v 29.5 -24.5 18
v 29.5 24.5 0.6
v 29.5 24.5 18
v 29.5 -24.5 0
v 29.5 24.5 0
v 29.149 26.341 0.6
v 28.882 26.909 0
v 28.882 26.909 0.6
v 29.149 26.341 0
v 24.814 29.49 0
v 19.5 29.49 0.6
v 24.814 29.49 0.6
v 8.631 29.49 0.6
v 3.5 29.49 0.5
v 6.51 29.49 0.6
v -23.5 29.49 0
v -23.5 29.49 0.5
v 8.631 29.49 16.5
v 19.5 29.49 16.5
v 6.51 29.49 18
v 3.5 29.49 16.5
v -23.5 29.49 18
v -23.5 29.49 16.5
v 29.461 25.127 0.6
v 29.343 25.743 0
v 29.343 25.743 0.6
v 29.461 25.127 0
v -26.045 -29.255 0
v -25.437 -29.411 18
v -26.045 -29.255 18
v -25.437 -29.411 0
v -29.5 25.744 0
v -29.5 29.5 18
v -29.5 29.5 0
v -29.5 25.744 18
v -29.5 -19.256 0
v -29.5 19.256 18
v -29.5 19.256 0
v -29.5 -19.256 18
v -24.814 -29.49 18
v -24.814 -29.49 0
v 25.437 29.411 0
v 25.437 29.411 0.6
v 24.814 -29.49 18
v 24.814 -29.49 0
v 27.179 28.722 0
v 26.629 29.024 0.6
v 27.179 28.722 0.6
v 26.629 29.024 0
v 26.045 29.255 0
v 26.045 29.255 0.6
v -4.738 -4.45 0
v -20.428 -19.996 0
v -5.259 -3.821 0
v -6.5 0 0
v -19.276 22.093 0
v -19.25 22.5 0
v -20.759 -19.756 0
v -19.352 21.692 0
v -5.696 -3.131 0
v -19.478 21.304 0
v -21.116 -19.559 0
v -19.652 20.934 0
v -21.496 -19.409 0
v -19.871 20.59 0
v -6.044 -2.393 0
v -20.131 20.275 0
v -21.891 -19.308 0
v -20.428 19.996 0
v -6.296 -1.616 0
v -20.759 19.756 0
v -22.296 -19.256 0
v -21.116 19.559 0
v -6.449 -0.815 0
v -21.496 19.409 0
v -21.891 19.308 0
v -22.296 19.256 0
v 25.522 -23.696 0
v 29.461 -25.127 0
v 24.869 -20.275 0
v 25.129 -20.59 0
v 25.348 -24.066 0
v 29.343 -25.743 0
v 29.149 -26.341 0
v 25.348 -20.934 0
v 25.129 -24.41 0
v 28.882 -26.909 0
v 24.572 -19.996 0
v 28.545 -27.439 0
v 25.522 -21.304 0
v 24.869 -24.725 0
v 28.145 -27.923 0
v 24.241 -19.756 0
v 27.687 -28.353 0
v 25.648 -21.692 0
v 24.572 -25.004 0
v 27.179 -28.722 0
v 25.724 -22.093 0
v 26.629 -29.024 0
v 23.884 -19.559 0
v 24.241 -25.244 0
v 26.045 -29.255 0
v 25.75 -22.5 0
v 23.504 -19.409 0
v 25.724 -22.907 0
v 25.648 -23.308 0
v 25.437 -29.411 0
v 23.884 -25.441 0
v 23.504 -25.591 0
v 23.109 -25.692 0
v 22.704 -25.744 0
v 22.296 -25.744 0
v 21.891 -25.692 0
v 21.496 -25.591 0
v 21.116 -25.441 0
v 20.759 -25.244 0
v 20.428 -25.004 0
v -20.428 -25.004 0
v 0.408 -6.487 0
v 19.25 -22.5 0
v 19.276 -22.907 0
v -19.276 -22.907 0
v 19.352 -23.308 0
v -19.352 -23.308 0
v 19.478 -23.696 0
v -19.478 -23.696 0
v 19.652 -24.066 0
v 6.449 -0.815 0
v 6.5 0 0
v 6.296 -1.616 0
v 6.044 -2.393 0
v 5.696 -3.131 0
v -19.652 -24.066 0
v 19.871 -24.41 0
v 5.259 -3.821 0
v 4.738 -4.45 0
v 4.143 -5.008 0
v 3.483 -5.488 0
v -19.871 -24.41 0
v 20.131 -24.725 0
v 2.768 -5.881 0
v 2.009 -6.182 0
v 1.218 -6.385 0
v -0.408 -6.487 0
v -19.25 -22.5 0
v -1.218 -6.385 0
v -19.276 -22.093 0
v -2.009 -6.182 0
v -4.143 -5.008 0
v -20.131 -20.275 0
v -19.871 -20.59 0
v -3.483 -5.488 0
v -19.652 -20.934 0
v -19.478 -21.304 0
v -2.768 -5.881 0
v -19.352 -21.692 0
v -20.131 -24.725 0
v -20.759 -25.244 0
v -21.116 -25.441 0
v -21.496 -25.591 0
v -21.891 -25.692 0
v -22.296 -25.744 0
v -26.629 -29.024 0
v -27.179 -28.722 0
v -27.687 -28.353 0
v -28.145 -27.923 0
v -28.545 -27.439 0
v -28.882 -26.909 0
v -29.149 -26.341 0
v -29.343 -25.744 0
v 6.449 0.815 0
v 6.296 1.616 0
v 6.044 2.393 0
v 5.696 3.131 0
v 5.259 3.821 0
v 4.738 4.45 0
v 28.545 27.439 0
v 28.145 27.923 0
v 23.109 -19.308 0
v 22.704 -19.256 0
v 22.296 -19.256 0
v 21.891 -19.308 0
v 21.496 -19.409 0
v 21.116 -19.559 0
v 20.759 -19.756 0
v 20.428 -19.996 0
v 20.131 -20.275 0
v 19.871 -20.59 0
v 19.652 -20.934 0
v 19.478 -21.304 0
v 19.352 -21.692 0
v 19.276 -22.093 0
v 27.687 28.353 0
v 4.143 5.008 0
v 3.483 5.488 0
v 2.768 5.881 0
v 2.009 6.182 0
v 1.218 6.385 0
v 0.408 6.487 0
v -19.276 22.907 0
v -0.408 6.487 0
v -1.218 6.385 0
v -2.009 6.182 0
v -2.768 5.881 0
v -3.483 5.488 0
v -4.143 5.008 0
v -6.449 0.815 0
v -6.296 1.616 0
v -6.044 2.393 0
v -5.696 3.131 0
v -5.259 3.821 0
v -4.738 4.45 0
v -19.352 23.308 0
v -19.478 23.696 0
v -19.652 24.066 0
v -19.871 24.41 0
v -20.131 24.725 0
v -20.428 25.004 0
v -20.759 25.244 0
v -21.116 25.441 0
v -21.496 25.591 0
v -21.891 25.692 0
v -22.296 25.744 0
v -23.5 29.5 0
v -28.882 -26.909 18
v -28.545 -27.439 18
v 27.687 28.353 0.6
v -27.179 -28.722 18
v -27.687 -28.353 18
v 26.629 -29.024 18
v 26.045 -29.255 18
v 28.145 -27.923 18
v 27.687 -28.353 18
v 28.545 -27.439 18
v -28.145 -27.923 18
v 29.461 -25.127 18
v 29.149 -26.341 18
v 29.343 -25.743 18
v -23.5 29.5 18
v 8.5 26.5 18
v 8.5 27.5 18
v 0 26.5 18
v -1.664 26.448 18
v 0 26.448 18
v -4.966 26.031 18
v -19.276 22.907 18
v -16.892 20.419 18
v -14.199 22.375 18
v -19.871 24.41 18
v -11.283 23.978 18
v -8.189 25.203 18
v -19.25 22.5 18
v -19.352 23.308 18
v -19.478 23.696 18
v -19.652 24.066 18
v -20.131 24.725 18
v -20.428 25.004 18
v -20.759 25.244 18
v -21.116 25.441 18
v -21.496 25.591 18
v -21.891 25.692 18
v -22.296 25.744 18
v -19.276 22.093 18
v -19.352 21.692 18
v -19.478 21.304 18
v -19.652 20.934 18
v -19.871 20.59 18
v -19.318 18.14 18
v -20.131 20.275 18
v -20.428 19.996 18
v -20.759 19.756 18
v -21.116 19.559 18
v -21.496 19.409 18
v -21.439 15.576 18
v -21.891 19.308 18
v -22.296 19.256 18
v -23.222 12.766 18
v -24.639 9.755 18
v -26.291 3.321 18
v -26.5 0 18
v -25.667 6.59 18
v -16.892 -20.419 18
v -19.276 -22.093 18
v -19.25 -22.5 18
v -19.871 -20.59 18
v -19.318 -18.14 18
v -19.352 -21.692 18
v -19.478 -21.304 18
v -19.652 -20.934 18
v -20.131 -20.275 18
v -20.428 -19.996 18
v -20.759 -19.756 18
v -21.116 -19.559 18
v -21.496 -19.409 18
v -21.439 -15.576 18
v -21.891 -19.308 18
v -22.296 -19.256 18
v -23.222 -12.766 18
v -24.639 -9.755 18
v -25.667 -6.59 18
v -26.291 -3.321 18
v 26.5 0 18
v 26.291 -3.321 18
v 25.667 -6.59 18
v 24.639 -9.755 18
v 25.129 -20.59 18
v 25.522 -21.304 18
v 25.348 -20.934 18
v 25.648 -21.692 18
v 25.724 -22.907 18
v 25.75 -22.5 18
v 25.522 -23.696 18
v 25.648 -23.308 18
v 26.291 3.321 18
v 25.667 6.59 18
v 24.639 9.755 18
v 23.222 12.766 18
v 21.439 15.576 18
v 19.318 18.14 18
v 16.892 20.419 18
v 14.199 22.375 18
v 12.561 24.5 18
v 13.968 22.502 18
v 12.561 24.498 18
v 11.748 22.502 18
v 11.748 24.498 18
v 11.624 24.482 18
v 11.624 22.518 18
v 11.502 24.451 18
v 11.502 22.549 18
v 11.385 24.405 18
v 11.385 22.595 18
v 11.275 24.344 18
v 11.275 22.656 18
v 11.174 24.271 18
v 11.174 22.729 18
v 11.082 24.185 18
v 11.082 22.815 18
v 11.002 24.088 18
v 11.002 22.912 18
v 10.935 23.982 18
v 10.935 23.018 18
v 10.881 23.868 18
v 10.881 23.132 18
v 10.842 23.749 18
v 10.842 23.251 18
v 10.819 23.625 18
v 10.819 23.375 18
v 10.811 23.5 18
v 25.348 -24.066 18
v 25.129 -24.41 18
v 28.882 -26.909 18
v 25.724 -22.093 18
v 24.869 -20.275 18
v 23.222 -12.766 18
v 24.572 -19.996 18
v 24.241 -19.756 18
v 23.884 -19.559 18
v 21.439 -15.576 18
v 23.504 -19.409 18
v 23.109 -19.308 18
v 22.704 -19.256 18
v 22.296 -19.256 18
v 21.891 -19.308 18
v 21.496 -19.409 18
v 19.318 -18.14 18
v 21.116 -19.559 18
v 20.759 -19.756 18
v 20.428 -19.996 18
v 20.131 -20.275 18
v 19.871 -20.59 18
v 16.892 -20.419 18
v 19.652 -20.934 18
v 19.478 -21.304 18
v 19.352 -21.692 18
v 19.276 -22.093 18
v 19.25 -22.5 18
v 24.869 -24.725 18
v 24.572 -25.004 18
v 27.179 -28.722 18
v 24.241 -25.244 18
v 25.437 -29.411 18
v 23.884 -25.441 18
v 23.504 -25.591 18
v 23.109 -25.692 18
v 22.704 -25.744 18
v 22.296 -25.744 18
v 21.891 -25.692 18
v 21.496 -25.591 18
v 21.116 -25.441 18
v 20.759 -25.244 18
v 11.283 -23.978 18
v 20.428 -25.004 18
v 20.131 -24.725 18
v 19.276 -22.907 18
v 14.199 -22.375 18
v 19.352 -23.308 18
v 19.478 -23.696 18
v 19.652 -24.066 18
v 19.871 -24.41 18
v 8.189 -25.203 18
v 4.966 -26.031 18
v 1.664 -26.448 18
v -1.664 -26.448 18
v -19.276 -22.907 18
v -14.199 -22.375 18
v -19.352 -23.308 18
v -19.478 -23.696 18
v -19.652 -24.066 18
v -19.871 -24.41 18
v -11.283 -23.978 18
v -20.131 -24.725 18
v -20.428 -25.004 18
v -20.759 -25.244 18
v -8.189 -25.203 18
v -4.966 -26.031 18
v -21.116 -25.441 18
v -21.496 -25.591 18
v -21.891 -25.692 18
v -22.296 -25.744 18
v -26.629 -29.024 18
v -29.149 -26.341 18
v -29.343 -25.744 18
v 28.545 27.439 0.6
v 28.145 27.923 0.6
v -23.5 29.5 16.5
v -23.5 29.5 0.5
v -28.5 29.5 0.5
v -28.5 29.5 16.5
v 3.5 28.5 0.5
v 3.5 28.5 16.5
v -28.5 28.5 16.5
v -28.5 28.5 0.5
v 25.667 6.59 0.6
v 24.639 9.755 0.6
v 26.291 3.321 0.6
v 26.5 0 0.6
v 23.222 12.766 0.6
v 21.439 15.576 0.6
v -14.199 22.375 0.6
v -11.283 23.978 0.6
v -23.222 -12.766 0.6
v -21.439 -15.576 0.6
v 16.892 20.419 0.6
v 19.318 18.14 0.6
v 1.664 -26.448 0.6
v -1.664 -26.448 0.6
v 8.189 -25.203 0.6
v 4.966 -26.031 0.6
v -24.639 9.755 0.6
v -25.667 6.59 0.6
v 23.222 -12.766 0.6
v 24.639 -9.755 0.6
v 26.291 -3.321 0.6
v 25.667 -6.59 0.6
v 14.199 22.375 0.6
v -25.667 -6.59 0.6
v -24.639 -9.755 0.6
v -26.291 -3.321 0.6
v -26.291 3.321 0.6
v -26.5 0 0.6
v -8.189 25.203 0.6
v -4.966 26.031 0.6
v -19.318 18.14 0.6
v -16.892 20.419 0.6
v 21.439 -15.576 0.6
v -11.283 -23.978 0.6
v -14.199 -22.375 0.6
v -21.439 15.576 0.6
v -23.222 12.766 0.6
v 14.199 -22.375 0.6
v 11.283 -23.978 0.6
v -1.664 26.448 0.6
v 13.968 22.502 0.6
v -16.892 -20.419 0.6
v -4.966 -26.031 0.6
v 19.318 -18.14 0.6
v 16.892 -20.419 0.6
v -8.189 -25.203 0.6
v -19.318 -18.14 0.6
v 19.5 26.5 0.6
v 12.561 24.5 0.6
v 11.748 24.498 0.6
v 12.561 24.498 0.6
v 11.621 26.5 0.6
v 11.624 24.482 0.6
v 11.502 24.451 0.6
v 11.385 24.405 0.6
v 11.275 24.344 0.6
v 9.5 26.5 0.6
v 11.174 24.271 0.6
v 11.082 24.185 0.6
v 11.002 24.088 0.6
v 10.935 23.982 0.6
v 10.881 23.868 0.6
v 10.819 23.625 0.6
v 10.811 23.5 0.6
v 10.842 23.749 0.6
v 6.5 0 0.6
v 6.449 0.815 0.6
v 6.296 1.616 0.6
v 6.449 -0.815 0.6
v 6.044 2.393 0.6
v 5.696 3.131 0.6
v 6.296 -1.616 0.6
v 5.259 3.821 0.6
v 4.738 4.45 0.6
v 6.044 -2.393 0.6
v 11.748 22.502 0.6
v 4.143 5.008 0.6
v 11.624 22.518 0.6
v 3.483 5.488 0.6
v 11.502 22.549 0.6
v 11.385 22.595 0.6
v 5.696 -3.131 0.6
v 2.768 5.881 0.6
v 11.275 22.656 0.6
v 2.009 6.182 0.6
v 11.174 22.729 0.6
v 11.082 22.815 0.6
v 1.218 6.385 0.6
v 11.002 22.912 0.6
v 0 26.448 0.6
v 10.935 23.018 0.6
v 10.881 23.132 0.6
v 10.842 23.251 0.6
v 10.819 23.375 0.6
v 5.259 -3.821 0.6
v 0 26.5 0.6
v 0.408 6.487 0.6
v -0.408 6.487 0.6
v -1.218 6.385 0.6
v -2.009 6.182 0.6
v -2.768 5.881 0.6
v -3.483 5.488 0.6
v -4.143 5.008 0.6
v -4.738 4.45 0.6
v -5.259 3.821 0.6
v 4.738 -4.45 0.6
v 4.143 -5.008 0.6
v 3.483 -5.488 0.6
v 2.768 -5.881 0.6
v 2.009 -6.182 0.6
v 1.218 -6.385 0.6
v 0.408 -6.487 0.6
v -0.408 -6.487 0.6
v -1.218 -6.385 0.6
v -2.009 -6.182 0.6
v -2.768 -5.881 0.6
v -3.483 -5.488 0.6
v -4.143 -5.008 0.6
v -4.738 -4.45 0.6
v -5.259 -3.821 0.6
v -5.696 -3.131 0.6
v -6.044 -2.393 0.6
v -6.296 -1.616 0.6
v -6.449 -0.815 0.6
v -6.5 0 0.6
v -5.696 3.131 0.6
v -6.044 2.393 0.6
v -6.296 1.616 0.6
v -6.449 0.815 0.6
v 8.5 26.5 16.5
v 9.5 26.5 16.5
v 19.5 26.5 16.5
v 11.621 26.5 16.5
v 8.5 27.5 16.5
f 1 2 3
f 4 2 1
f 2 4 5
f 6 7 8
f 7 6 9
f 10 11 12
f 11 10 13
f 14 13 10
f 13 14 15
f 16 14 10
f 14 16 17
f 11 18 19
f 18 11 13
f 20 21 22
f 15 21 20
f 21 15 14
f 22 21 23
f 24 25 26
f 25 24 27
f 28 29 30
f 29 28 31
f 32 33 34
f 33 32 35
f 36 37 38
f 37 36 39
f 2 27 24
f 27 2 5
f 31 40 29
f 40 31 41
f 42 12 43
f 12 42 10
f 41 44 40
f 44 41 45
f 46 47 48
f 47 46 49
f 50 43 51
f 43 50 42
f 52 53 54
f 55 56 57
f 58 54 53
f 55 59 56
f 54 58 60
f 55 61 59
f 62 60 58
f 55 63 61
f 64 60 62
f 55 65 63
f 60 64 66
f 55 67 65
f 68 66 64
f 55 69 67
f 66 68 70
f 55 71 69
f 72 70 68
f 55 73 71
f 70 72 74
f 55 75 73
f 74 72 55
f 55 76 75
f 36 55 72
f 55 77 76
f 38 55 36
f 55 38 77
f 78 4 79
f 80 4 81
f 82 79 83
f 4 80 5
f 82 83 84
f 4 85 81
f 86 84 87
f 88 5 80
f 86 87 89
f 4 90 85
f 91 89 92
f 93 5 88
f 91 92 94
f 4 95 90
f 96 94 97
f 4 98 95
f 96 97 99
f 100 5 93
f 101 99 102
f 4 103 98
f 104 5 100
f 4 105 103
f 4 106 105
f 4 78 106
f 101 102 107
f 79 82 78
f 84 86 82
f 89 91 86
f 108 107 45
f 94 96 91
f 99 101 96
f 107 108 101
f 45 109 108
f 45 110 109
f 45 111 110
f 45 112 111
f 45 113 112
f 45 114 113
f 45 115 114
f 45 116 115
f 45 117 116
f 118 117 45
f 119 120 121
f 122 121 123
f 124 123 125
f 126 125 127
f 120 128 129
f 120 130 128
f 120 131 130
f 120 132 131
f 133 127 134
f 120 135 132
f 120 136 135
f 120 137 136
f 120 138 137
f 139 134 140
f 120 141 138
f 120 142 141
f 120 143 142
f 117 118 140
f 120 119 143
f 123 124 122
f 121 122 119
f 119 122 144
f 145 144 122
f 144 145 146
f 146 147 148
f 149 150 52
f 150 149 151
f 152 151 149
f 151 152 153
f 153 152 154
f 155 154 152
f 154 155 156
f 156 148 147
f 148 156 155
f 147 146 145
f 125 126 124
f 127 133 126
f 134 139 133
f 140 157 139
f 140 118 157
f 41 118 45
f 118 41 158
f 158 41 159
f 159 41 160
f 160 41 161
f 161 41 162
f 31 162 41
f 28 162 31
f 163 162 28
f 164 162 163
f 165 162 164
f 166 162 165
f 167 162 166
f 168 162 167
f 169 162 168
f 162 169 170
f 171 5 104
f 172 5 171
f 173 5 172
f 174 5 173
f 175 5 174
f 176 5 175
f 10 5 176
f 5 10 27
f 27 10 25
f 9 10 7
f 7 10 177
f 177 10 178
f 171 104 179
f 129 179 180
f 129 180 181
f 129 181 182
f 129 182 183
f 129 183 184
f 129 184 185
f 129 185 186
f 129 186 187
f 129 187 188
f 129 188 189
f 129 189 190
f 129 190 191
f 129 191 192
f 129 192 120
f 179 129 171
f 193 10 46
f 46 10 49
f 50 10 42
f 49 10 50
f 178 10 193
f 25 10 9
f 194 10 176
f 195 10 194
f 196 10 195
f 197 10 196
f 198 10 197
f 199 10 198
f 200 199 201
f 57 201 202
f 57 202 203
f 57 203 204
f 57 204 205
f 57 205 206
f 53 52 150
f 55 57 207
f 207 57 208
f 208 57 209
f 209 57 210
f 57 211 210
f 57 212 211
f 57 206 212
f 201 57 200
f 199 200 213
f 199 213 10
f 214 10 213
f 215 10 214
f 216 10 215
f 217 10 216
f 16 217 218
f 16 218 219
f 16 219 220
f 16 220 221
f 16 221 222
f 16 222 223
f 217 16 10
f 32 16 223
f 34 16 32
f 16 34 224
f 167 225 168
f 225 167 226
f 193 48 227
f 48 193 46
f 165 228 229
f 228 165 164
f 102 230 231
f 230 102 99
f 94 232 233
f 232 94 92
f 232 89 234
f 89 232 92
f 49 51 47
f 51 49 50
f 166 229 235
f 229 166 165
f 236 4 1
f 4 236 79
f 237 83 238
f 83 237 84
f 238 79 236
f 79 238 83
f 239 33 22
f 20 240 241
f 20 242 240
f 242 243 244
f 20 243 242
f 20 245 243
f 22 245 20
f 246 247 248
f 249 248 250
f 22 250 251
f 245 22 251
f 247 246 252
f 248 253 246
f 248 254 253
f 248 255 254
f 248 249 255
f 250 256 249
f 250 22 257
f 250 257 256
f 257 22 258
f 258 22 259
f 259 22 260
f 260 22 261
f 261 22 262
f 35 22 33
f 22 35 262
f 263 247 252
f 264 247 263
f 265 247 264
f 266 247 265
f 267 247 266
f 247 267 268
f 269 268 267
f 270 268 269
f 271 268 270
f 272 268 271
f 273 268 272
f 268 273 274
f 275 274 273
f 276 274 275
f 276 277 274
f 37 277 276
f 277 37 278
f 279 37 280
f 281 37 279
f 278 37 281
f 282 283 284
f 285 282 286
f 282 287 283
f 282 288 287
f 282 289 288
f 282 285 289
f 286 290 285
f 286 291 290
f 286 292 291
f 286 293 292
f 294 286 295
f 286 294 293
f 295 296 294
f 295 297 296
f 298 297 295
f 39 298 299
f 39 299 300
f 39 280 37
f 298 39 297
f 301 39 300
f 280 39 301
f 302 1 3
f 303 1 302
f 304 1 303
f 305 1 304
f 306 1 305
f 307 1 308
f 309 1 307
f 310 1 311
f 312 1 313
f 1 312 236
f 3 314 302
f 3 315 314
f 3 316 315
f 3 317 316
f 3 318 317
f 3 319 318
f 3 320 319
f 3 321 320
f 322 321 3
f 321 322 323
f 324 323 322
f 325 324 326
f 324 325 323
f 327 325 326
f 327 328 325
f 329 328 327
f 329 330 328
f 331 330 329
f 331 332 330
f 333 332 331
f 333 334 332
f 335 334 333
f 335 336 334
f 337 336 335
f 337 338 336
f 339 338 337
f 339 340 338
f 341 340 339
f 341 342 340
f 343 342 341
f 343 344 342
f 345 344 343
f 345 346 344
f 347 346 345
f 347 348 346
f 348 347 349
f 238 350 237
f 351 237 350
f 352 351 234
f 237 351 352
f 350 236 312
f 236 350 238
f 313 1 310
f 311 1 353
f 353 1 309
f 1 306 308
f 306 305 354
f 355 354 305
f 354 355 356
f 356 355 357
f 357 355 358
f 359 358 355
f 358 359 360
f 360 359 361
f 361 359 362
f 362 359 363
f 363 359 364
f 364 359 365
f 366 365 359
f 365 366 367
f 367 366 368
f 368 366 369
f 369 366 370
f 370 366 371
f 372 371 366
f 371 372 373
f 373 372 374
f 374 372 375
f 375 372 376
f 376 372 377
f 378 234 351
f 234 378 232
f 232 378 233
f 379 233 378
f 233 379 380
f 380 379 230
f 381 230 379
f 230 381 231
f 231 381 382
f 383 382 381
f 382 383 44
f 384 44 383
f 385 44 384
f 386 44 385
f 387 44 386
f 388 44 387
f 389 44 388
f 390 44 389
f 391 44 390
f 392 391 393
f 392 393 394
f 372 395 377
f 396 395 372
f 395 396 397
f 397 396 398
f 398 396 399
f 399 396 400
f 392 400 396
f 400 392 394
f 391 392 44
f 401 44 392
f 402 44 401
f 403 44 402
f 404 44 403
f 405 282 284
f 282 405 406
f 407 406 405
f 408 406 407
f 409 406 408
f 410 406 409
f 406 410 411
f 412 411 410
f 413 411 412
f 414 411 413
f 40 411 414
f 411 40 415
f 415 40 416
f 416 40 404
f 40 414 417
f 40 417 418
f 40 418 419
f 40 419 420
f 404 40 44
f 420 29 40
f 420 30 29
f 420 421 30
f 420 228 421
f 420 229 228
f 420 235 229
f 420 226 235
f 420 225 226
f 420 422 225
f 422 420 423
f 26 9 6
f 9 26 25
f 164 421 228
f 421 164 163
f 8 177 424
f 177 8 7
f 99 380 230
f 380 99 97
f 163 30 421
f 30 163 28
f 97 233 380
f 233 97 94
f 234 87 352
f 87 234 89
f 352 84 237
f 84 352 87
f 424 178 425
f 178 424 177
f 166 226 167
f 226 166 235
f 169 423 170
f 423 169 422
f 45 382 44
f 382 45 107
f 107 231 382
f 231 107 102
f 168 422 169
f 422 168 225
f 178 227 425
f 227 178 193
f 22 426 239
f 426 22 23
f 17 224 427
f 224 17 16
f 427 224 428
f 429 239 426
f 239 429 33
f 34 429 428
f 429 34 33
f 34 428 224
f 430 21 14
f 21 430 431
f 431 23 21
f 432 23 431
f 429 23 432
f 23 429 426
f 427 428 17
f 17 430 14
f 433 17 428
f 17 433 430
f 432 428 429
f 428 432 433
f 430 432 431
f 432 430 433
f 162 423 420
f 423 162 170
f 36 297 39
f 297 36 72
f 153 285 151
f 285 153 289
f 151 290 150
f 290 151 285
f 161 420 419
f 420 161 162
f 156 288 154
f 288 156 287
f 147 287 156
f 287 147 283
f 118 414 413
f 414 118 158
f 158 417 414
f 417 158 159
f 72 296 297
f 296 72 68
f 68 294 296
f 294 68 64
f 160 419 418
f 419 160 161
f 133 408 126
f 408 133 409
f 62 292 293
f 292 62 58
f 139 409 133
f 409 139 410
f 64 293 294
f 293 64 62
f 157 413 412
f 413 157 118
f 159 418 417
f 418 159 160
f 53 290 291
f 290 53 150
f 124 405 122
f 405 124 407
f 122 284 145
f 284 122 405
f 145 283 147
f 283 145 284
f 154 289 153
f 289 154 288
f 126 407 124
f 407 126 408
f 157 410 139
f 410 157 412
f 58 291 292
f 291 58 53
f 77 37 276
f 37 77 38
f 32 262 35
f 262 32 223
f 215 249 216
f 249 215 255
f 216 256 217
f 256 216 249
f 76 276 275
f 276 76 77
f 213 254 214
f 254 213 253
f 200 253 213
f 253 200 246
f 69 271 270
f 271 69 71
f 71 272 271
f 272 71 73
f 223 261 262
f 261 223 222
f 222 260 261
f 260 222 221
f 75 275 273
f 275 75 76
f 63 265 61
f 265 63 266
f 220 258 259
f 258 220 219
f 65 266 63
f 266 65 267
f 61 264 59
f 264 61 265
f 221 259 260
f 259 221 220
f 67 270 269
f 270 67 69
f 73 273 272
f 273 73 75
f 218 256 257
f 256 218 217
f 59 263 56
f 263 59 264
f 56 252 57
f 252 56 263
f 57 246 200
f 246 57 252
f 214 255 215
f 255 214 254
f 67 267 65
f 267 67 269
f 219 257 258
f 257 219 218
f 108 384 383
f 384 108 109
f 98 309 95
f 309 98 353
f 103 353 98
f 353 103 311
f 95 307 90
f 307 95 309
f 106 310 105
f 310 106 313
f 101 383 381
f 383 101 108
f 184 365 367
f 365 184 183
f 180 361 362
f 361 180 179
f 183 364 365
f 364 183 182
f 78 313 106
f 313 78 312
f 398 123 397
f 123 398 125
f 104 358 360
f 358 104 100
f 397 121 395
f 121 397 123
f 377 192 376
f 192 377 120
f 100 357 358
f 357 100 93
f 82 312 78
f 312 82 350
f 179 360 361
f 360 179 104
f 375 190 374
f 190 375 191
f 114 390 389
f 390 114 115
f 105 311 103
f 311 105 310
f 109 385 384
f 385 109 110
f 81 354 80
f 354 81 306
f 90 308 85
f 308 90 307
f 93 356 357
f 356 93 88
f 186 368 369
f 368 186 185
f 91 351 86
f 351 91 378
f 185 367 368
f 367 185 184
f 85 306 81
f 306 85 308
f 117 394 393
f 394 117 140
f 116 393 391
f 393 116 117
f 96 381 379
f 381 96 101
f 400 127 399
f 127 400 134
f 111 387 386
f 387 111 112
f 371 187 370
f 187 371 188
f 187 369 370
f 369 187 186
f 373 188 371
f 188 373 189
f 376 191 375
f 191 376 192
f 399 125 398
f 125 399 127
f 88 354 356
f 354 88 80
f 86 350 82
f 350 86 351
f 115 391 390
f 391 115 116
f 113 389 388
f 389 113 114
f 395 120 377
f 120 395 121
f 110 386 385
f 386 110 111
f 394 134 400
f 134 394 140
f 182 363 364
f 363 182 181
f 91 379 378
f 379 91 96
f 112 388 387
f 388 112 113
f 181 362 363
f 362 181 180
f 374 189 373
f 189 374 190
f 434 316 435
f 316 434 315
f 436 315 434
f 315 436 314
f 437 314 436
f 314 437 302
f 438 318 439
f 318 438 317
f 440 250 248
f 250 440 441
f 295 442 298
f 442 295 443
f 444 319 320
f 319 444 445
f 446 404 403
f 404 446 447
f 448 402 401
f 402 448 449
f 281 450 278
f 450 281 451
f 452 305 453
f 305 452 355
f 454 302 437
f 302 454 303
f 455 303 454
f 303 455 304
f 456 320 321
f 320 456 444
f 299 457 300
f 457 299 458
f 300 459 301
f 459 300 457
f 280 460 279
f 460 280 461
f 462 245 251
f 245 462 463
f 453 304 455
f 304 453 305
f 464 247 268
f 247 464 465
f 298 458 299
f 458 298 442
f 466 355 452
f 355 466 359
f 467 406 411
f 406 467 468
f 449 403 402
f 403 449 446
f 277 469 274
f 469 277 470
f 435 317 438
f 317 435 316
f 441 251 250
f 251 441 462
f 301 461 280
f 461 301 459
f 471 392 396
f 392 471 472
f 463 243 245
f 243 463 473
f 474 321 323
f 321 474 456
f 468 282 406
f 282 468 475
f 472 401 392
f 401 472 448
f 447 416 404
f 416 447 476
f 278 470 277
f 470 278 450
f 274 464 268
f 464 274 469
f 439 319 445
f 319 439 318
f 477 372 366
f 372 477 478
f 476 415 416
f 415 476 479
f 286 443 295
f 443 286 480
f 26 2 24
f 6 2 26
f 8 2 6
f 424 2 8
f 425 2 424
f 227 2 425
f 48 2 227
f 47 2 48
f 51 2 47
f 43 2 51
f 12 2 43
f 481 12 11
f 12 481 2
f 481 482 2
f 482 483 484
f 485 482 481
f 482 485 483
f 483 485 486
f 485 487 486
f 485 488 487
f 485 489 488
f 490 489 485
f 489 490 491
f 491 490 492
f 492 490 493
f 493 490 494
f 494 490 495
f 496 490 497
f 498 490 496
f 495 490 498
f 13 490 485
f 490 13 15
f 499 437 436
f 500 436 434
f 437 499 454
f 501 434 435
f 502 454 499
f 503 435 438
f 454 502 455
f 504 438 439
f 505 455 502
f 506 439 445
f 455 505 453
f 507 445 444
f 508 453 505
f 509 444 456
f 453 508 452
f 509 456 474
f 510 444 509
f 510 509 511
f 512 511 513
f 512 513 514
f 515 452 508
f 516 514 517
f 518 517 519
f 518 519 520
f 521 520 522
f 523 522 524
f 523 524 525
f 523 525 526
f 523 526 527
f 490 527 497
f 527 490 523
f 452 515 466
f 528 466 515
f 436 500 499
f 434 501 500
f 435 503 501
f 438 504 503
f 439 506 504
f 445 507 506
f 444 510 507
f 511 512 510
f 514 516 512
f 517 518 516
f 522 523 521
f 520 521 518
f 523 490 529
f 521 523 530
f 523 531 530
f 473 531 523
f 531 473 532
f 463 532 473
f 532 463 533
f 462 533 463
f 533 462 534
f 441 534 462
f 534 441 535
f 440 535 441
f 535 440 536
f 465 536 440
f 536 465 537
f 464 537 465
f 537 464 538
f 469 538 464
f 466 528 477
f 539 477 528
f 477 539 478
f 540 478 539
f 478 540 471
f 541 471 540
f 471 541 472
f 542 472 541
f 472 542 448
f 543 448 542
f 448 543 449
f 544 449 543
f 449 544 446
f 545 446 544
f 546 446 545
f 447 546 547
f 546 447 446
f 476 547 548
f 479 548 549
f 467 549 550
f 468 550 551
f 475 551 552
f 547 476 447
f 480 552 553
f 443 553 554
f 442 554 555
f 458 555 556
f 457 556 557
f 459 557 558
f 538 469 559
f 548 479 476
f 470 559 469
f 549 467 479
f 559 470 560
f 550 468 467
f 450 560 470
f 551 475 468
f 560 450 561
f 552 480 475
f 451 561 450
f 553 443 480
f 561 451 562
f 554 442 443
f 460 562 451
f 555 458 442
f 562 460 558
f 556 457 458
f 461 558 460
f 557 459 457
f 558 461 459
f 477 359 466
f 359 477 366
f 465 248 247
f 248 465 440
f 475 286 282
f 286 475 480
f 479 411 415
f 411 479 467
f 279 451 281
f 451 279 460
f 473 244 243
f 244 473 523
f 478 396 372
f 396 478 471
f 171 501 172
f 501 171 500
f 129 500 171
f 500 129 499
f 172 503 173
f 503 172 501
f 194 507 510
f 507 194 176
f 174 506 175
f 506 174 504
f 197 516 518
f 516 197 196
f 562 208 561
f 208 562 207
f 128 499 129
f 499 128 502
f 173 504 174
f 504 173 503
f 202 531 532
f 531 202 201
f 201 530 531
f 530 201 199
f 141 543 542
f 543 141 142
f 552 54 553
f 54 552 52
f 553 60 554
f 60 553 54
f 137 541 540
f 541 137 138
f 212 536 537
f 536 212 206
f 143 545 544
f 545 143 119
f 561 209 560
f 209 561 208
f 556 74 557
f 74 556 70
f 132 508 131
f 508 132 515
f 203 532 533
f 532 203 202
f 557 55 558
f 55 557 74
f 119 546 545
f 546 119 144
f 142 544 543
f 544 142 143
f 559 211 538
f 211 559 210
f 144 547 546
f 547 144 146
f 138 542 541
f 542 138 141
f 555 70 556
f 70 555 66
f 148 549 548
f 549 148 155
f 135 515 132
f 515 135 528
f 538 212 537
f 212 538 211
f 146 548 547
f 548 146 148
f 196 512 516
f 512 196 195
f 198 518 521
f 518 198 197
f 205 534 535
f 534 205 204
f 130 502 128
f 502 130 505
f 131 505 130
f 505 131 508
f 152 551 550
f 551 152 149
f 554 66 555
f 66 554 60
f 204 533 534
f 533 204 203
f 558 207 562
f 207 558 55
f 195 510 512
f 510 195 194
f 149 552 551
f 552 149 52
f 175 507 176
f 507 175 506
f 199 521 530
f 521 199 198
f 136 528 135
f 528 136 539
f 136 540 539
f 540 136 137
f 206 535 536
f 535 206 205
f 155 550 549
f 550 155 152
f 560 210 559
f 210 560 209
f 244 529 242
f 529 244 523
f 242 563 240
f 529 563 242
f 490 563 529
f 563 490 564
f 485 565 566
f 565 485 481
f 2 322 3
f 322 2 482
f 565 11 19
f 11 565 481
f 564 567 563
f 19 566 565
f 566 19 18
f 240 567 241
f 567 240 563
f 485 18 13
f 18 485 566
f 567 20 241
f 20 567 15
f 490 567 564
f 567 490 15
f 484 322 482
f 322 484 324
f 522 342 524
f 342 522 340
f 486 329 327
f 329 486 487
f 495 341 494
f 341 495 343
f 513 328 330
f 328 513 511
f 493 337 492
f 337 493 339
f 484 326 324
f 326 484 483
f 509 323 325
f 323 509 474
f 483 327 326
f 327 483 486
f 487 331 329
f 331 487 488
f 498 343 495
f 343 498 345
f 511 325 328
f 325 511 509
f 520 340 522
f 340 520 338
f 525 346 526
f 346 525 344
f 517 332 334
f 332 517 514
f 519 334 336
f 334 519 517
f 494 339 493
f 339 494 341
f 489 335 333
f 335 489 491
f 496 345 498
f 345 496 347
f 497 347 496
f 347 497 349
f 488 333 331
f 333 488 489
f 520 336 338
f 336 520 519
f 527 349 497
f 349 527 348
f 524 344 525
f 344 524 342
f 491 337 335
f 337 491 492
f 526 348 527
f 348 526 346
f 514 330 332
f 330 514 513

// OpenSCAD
$fn = 50;


union() {
	difference() {
		union() {
			translate(v = [0, 0, 0]) {
				rotate(a = [0, 0, 0]) {
					hull() {
						translate(v = [-24.5000000000, 24.5000000000, 0]) {
							rotate(a = [0, 0, 0]) {
								translate(v = [0, 0, 0]) {
									rotate(a = [0, 0, 0]) {
										cylinder(h = 18, r = 5);
									}
								}
							}
						}
						translate(v = [24.5000000000, 24.5000000000, 0]) {
							rotate(a = [0, 0, 0]) {
								translate(v = [0, 0, 0]) {
									rotate(a = [0, 0, 0]) {
										cylinder(h = 18, r = 5);
									}
								}
							}
						}
						translate(v = [-24.5000000000, -24.5000000000, 0]) {
							rotate(a = [0, 0, 0]) {
								translate(v = [0, 0, 0]) {
									rotate(a = [0, 0, 0]) {
										cylinder(h = 18, r = 5);
									}
								}
							}
						}
						translate(v = [24.5000000000, -24.5000000000, 0]) {
							rotate(a = [0, 0, 0]) {
								translate(v = [0, 0, 0]) {
									rotate(a = [0, 0, 0]) {
										cylinder(h = 18, r = 5);
									}
								}
							}
						}
					}
				}
			}
			translate(v = [-29.5000000000, 23.5000000000, 0]) {
				rotate(a = [0, 0, 0]) {
					cube(size = [6, 6, 18]);
				}
			}
		}
		union() {
			#translate(v = [-28.5000000000, 28.5000000000, 0.5000000000]) {
				rotate(a = [0, 0, 0]) {
					cube(size = [32, 1, 16]);
				}
			}
			translate(v = [-30.0000000000, -22.5000000000, -125]) {
				rotate(a = [0, 0, 0]) {
					hull() {
						translate(v = [7.5000000000, 0, 0]) {
							rotate(a = [0, 0, 0]) {
								translate(v = [0, 0, 0]) {
									rotate(a = [0, 0, 0]) {
										cylinder(h = 250, r = 3.2500000000);
									}
								}
							}
						}
						translate(v = [-7.5000000000, 0, 0]) {
							rotate(a = [0, 0, 0]) {
								translate(v = [0, 0, 0]) {
									rotate(a = [0, 0, 0]) {
										cylinder(h = 250, r = 3.2500000000);
									}
								}
							}
						}
					}
				}
			}
			translate(v = [-30.0000000000, 22.5000000000, -125]) {
				rotate(a = [0, 0, 0]) {
					hull() {
						translate(v = [7.5000000000, 0, 0]) {
							rotate(a = [0, 0, 0]) {
								translate(v = [0, 0, 0]) {
									rotate(a = [0, 0, 0]) {
										cylinder(h = 250, r = 3.2500000000);
									}
								}
							}
						}
						translate(v = [-7.5000000000, 0, 0]) {
							rotate(a = [0, 0, 0]) {
								translate(v = [0, 0, 0]) {
									rotate(a = [0, 0, 0]) {
										cylinder(h = 250, r = 3.2500000000);
									}
								}
							}
						}
					}
				}
			}
			translate(v = [22.5000000000, -22.5000000000, -125.0000000000]) {
				rotate(a = [0, 0, 0]) {
					cylinder(h = 250, r = 3.2500000000);
				}
			}
			translate(v = [0, 0, 0.6000000000]) {
				rotate(a = [0, 0, 0]) {
					cylinder(h = 20.4000000000, r = 26.5000000000);
				}
			}
			translate(v = [0, 0, -9.0000000000]) {
				rotate(a = [0, 0, 0]) {
					cylinder(h = 18, r = 6.5000000000);
				}
			}
			translate(v = [0.0000000000, 24.5000000000, 0.6000000000]) {
				rotate(a = [0, 0, 0]) {
					cube(size = [29.5000000000, 2, 20.4000000000]);
				}
			}
			translate(v = [19.5000000000, 24.5000000000, 0.6000000000]) {
				rotate(a = [0, 0, 0]) {
					cube(size = [10, 5, 20.4000000000]);
				}
			}
			translate(v = [8.5000000000, 24.5000000000, 16.5000000000]) {
				rotate(a = [0, 0, 0]) {
					cube(size = [21, 5, 1.5000000000]);
				}
			}
			translate(v = [5.7500000000, 30.2500000000, 0.6000000000]) {
				rotate(a = [0, 0, -45]) {
					cube(size = [7.5000000000, 1.5000000000, 20.4000000000]);
				}
			}
			translate(v = [5.0610000000, 22.5000000000, 0.6000000000]) {
				rotate(a = [0, 0, 0]) {
					cube(size = [7.5000000000, 2, 17.4000000000]);
				}
			}
		}
	}
	union() {
		translate(v = [14.3110000000, 23.5000000000, 0]) {
			rotate(a = [0, 0, 0]) {
				hull() {
					translate(v = [2.5000000000, 0, 0]) {
						rotate(a = [0, 0, 0]) {
							#translate(v = [0, 0, 0]) {
								rotate(a = [0, 0, 0]) {
									cylinder(h = 18, r = 1.0000000000);
								}
							}
						}
					}
					translate(v = [-2.5000000000, 0, 0]) {
						rotate(a = [0, 0, 0]) {
							#translate(v = [0, 0, 0]) {
								rotate(a = [0, 0, 0]) {
									cylinder(h = 18, r = 1.0000000000);
								}
							}
						}
					}
				}
			}
		}
	}
}
